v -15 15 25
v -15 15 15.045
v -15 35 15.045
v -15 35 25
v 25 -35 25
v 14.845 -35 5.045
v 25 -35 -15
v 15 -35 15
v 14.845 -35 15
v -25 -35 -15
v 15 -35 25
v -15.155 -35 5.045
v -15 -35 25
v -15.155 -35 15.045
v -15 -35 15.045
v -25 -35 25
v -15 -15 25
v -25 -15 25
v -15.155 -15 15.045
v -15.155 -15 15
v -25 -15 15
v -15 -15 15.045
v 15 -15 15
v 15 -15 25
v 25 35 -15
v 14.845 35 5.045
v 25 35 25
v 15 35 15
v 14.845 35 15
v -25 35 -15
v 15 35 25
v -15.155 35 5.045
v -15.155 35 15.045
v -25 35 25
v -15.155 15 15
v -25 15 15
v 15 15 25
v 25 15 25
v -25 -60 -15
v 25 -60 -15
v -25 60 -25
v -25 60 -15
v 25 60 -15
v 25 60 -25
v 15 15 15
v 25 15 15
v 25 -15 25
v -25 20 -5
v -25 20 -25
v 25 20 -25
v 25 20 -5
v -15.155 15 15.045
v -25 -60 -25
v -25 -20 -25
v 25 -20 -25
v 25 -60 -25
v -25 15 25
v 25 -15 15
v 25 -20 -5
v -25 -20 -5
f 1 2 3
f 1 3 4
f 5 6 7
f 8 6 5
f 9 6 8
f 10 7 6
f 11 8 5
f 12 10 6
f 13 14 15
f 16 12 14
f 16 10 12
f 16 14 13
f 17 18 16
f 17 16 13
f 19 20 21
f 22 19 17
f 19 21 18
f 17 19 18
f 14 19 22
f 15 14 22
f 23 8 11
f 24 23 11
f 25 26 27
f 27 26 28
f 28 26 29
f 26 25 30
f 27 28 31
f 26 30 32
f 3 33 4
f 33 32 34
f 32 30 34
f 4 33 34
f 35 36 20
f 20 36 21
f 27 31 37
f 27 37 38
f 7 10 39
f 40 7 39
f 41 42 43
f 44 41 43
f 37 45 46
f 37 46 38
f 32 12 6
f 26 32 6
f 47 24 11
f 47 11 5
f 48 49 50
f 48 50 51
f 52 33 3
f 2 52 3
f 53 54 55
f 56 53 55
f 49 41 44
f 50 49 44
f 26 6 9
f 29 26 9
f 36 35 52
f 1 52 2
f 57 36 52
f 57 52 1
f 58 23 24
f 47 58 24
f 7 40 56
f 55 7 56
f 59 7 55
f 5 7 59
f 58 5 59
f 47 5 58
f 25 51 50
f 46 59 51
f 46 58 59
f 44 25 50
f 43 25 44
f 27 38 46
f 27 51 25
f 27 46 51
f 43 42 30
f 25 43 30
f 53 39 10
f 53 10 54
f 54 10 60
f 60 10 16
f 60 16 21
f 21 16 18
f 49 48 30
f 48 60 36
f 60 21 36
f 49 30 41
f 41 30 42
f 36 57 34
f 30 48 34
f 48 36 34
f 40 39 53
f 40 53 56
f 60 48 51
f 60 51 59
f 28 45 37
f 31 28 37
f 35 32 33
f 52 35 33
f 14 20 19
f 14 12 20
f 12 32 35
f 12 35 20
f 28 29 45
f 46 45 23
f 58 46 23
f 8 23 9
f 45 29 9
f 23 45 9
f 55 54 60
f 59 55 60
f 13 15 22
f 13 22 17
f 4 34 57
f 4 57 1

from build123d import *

# Parameters (mm, degrees)
F1_W      = 50
F1_H      = 120
F2_DEPTH  = 25
F3_W      = 40
F3_H      = 40
F4_DEPTH  = 50
F5_W      = 25
F5_H      = 40
F6_DEPTH  = 50
F7_W      = 25
F7_H      = 40
F8_DEPTH  = 50
F9_W      = 30
F9_H      = 10
F10_DEPTH = 50
F11_W     = 30
F11_H     = 10
F12_DEPTH = 70
F13_W     = 30
F13_H     = 10
F14_DEPTH = 70


with BuildPart() as f2:
    # F1 (on Top) → F2 (new body, symmetric)
    with BuildSketch(Plane.XY):
        Rectangle(F1_W, F1_H)
    extrude(amount=F2_DEPTH, both=True)

    # F3 (on face) → F4 (cut)
    with BuildSketch(Plane(origin=(-25, 0, 0), x_dir=(0, -1, 0), z_dir=(-1, 0, 0))):
        with Locations((0, -25)):
            Rectangle(F3_W, F3_H)
    extrude(amount=-F4_DEPTH, mode=Mode.SUBTRACT)

    # F5 (on face) → F6 (cut)
    with BuildSketch(Plane(origin=(-25, 0, 0), x_dir=(0, -1, 0), z_dir=(-1, 0, 0))):
        with Locations((-47.5, 5)):
            Rectangle(F5_W, F5_H)
    extrude(amount=-F6_DEPTH, mode=Mode.SUBTRACT)

    # F7 (on face) → F8 (cut)
    with BuildSketch(Plane(origin=(-25, 0, 0), x_dir=(0, -1, 0), z_dir=(-1, 0, 0))):
        with Locations((47.5, 5)):
            Rectangle(F7_W, F7_H)
    extrude(amount=-F8_DEPTH, mode=Mode.SUBTRACT)

    # F9 (on face) → F10 (cut)
    with BuildSketch(Plane(origin=(-25, 0, 0), x_dir=(0, -1, 0), z_dir=(-1, 0, 0))):
        with Locations((0, 20)):
            Rectangle(F9_W, F9_H)
    extrude(amount=-F10_DEPTH, mode=Mode.SUBTRACT)

    # F11 (on face) → F12 (cut)
    with BuildSketch(Plane.XZ.offset(35)):
        with Locations((0, 20)):
            Rectangle(F11_W, F11_H)
    extrude(amount=-F12_DEPTH, mode=Mode.SUBTRACT)

    # F13 (on face) → F14 (cut)
    with BuildSketch(Plane.XZ.offset(35)):
        with Locations((-0.1553255133, 10.0446071414)):
            Rectangle(F13_W, F13_H)
    extrude(amount=-F14_DEPTH, mode=Mode.SUBTRACT)


solid = f2.part
